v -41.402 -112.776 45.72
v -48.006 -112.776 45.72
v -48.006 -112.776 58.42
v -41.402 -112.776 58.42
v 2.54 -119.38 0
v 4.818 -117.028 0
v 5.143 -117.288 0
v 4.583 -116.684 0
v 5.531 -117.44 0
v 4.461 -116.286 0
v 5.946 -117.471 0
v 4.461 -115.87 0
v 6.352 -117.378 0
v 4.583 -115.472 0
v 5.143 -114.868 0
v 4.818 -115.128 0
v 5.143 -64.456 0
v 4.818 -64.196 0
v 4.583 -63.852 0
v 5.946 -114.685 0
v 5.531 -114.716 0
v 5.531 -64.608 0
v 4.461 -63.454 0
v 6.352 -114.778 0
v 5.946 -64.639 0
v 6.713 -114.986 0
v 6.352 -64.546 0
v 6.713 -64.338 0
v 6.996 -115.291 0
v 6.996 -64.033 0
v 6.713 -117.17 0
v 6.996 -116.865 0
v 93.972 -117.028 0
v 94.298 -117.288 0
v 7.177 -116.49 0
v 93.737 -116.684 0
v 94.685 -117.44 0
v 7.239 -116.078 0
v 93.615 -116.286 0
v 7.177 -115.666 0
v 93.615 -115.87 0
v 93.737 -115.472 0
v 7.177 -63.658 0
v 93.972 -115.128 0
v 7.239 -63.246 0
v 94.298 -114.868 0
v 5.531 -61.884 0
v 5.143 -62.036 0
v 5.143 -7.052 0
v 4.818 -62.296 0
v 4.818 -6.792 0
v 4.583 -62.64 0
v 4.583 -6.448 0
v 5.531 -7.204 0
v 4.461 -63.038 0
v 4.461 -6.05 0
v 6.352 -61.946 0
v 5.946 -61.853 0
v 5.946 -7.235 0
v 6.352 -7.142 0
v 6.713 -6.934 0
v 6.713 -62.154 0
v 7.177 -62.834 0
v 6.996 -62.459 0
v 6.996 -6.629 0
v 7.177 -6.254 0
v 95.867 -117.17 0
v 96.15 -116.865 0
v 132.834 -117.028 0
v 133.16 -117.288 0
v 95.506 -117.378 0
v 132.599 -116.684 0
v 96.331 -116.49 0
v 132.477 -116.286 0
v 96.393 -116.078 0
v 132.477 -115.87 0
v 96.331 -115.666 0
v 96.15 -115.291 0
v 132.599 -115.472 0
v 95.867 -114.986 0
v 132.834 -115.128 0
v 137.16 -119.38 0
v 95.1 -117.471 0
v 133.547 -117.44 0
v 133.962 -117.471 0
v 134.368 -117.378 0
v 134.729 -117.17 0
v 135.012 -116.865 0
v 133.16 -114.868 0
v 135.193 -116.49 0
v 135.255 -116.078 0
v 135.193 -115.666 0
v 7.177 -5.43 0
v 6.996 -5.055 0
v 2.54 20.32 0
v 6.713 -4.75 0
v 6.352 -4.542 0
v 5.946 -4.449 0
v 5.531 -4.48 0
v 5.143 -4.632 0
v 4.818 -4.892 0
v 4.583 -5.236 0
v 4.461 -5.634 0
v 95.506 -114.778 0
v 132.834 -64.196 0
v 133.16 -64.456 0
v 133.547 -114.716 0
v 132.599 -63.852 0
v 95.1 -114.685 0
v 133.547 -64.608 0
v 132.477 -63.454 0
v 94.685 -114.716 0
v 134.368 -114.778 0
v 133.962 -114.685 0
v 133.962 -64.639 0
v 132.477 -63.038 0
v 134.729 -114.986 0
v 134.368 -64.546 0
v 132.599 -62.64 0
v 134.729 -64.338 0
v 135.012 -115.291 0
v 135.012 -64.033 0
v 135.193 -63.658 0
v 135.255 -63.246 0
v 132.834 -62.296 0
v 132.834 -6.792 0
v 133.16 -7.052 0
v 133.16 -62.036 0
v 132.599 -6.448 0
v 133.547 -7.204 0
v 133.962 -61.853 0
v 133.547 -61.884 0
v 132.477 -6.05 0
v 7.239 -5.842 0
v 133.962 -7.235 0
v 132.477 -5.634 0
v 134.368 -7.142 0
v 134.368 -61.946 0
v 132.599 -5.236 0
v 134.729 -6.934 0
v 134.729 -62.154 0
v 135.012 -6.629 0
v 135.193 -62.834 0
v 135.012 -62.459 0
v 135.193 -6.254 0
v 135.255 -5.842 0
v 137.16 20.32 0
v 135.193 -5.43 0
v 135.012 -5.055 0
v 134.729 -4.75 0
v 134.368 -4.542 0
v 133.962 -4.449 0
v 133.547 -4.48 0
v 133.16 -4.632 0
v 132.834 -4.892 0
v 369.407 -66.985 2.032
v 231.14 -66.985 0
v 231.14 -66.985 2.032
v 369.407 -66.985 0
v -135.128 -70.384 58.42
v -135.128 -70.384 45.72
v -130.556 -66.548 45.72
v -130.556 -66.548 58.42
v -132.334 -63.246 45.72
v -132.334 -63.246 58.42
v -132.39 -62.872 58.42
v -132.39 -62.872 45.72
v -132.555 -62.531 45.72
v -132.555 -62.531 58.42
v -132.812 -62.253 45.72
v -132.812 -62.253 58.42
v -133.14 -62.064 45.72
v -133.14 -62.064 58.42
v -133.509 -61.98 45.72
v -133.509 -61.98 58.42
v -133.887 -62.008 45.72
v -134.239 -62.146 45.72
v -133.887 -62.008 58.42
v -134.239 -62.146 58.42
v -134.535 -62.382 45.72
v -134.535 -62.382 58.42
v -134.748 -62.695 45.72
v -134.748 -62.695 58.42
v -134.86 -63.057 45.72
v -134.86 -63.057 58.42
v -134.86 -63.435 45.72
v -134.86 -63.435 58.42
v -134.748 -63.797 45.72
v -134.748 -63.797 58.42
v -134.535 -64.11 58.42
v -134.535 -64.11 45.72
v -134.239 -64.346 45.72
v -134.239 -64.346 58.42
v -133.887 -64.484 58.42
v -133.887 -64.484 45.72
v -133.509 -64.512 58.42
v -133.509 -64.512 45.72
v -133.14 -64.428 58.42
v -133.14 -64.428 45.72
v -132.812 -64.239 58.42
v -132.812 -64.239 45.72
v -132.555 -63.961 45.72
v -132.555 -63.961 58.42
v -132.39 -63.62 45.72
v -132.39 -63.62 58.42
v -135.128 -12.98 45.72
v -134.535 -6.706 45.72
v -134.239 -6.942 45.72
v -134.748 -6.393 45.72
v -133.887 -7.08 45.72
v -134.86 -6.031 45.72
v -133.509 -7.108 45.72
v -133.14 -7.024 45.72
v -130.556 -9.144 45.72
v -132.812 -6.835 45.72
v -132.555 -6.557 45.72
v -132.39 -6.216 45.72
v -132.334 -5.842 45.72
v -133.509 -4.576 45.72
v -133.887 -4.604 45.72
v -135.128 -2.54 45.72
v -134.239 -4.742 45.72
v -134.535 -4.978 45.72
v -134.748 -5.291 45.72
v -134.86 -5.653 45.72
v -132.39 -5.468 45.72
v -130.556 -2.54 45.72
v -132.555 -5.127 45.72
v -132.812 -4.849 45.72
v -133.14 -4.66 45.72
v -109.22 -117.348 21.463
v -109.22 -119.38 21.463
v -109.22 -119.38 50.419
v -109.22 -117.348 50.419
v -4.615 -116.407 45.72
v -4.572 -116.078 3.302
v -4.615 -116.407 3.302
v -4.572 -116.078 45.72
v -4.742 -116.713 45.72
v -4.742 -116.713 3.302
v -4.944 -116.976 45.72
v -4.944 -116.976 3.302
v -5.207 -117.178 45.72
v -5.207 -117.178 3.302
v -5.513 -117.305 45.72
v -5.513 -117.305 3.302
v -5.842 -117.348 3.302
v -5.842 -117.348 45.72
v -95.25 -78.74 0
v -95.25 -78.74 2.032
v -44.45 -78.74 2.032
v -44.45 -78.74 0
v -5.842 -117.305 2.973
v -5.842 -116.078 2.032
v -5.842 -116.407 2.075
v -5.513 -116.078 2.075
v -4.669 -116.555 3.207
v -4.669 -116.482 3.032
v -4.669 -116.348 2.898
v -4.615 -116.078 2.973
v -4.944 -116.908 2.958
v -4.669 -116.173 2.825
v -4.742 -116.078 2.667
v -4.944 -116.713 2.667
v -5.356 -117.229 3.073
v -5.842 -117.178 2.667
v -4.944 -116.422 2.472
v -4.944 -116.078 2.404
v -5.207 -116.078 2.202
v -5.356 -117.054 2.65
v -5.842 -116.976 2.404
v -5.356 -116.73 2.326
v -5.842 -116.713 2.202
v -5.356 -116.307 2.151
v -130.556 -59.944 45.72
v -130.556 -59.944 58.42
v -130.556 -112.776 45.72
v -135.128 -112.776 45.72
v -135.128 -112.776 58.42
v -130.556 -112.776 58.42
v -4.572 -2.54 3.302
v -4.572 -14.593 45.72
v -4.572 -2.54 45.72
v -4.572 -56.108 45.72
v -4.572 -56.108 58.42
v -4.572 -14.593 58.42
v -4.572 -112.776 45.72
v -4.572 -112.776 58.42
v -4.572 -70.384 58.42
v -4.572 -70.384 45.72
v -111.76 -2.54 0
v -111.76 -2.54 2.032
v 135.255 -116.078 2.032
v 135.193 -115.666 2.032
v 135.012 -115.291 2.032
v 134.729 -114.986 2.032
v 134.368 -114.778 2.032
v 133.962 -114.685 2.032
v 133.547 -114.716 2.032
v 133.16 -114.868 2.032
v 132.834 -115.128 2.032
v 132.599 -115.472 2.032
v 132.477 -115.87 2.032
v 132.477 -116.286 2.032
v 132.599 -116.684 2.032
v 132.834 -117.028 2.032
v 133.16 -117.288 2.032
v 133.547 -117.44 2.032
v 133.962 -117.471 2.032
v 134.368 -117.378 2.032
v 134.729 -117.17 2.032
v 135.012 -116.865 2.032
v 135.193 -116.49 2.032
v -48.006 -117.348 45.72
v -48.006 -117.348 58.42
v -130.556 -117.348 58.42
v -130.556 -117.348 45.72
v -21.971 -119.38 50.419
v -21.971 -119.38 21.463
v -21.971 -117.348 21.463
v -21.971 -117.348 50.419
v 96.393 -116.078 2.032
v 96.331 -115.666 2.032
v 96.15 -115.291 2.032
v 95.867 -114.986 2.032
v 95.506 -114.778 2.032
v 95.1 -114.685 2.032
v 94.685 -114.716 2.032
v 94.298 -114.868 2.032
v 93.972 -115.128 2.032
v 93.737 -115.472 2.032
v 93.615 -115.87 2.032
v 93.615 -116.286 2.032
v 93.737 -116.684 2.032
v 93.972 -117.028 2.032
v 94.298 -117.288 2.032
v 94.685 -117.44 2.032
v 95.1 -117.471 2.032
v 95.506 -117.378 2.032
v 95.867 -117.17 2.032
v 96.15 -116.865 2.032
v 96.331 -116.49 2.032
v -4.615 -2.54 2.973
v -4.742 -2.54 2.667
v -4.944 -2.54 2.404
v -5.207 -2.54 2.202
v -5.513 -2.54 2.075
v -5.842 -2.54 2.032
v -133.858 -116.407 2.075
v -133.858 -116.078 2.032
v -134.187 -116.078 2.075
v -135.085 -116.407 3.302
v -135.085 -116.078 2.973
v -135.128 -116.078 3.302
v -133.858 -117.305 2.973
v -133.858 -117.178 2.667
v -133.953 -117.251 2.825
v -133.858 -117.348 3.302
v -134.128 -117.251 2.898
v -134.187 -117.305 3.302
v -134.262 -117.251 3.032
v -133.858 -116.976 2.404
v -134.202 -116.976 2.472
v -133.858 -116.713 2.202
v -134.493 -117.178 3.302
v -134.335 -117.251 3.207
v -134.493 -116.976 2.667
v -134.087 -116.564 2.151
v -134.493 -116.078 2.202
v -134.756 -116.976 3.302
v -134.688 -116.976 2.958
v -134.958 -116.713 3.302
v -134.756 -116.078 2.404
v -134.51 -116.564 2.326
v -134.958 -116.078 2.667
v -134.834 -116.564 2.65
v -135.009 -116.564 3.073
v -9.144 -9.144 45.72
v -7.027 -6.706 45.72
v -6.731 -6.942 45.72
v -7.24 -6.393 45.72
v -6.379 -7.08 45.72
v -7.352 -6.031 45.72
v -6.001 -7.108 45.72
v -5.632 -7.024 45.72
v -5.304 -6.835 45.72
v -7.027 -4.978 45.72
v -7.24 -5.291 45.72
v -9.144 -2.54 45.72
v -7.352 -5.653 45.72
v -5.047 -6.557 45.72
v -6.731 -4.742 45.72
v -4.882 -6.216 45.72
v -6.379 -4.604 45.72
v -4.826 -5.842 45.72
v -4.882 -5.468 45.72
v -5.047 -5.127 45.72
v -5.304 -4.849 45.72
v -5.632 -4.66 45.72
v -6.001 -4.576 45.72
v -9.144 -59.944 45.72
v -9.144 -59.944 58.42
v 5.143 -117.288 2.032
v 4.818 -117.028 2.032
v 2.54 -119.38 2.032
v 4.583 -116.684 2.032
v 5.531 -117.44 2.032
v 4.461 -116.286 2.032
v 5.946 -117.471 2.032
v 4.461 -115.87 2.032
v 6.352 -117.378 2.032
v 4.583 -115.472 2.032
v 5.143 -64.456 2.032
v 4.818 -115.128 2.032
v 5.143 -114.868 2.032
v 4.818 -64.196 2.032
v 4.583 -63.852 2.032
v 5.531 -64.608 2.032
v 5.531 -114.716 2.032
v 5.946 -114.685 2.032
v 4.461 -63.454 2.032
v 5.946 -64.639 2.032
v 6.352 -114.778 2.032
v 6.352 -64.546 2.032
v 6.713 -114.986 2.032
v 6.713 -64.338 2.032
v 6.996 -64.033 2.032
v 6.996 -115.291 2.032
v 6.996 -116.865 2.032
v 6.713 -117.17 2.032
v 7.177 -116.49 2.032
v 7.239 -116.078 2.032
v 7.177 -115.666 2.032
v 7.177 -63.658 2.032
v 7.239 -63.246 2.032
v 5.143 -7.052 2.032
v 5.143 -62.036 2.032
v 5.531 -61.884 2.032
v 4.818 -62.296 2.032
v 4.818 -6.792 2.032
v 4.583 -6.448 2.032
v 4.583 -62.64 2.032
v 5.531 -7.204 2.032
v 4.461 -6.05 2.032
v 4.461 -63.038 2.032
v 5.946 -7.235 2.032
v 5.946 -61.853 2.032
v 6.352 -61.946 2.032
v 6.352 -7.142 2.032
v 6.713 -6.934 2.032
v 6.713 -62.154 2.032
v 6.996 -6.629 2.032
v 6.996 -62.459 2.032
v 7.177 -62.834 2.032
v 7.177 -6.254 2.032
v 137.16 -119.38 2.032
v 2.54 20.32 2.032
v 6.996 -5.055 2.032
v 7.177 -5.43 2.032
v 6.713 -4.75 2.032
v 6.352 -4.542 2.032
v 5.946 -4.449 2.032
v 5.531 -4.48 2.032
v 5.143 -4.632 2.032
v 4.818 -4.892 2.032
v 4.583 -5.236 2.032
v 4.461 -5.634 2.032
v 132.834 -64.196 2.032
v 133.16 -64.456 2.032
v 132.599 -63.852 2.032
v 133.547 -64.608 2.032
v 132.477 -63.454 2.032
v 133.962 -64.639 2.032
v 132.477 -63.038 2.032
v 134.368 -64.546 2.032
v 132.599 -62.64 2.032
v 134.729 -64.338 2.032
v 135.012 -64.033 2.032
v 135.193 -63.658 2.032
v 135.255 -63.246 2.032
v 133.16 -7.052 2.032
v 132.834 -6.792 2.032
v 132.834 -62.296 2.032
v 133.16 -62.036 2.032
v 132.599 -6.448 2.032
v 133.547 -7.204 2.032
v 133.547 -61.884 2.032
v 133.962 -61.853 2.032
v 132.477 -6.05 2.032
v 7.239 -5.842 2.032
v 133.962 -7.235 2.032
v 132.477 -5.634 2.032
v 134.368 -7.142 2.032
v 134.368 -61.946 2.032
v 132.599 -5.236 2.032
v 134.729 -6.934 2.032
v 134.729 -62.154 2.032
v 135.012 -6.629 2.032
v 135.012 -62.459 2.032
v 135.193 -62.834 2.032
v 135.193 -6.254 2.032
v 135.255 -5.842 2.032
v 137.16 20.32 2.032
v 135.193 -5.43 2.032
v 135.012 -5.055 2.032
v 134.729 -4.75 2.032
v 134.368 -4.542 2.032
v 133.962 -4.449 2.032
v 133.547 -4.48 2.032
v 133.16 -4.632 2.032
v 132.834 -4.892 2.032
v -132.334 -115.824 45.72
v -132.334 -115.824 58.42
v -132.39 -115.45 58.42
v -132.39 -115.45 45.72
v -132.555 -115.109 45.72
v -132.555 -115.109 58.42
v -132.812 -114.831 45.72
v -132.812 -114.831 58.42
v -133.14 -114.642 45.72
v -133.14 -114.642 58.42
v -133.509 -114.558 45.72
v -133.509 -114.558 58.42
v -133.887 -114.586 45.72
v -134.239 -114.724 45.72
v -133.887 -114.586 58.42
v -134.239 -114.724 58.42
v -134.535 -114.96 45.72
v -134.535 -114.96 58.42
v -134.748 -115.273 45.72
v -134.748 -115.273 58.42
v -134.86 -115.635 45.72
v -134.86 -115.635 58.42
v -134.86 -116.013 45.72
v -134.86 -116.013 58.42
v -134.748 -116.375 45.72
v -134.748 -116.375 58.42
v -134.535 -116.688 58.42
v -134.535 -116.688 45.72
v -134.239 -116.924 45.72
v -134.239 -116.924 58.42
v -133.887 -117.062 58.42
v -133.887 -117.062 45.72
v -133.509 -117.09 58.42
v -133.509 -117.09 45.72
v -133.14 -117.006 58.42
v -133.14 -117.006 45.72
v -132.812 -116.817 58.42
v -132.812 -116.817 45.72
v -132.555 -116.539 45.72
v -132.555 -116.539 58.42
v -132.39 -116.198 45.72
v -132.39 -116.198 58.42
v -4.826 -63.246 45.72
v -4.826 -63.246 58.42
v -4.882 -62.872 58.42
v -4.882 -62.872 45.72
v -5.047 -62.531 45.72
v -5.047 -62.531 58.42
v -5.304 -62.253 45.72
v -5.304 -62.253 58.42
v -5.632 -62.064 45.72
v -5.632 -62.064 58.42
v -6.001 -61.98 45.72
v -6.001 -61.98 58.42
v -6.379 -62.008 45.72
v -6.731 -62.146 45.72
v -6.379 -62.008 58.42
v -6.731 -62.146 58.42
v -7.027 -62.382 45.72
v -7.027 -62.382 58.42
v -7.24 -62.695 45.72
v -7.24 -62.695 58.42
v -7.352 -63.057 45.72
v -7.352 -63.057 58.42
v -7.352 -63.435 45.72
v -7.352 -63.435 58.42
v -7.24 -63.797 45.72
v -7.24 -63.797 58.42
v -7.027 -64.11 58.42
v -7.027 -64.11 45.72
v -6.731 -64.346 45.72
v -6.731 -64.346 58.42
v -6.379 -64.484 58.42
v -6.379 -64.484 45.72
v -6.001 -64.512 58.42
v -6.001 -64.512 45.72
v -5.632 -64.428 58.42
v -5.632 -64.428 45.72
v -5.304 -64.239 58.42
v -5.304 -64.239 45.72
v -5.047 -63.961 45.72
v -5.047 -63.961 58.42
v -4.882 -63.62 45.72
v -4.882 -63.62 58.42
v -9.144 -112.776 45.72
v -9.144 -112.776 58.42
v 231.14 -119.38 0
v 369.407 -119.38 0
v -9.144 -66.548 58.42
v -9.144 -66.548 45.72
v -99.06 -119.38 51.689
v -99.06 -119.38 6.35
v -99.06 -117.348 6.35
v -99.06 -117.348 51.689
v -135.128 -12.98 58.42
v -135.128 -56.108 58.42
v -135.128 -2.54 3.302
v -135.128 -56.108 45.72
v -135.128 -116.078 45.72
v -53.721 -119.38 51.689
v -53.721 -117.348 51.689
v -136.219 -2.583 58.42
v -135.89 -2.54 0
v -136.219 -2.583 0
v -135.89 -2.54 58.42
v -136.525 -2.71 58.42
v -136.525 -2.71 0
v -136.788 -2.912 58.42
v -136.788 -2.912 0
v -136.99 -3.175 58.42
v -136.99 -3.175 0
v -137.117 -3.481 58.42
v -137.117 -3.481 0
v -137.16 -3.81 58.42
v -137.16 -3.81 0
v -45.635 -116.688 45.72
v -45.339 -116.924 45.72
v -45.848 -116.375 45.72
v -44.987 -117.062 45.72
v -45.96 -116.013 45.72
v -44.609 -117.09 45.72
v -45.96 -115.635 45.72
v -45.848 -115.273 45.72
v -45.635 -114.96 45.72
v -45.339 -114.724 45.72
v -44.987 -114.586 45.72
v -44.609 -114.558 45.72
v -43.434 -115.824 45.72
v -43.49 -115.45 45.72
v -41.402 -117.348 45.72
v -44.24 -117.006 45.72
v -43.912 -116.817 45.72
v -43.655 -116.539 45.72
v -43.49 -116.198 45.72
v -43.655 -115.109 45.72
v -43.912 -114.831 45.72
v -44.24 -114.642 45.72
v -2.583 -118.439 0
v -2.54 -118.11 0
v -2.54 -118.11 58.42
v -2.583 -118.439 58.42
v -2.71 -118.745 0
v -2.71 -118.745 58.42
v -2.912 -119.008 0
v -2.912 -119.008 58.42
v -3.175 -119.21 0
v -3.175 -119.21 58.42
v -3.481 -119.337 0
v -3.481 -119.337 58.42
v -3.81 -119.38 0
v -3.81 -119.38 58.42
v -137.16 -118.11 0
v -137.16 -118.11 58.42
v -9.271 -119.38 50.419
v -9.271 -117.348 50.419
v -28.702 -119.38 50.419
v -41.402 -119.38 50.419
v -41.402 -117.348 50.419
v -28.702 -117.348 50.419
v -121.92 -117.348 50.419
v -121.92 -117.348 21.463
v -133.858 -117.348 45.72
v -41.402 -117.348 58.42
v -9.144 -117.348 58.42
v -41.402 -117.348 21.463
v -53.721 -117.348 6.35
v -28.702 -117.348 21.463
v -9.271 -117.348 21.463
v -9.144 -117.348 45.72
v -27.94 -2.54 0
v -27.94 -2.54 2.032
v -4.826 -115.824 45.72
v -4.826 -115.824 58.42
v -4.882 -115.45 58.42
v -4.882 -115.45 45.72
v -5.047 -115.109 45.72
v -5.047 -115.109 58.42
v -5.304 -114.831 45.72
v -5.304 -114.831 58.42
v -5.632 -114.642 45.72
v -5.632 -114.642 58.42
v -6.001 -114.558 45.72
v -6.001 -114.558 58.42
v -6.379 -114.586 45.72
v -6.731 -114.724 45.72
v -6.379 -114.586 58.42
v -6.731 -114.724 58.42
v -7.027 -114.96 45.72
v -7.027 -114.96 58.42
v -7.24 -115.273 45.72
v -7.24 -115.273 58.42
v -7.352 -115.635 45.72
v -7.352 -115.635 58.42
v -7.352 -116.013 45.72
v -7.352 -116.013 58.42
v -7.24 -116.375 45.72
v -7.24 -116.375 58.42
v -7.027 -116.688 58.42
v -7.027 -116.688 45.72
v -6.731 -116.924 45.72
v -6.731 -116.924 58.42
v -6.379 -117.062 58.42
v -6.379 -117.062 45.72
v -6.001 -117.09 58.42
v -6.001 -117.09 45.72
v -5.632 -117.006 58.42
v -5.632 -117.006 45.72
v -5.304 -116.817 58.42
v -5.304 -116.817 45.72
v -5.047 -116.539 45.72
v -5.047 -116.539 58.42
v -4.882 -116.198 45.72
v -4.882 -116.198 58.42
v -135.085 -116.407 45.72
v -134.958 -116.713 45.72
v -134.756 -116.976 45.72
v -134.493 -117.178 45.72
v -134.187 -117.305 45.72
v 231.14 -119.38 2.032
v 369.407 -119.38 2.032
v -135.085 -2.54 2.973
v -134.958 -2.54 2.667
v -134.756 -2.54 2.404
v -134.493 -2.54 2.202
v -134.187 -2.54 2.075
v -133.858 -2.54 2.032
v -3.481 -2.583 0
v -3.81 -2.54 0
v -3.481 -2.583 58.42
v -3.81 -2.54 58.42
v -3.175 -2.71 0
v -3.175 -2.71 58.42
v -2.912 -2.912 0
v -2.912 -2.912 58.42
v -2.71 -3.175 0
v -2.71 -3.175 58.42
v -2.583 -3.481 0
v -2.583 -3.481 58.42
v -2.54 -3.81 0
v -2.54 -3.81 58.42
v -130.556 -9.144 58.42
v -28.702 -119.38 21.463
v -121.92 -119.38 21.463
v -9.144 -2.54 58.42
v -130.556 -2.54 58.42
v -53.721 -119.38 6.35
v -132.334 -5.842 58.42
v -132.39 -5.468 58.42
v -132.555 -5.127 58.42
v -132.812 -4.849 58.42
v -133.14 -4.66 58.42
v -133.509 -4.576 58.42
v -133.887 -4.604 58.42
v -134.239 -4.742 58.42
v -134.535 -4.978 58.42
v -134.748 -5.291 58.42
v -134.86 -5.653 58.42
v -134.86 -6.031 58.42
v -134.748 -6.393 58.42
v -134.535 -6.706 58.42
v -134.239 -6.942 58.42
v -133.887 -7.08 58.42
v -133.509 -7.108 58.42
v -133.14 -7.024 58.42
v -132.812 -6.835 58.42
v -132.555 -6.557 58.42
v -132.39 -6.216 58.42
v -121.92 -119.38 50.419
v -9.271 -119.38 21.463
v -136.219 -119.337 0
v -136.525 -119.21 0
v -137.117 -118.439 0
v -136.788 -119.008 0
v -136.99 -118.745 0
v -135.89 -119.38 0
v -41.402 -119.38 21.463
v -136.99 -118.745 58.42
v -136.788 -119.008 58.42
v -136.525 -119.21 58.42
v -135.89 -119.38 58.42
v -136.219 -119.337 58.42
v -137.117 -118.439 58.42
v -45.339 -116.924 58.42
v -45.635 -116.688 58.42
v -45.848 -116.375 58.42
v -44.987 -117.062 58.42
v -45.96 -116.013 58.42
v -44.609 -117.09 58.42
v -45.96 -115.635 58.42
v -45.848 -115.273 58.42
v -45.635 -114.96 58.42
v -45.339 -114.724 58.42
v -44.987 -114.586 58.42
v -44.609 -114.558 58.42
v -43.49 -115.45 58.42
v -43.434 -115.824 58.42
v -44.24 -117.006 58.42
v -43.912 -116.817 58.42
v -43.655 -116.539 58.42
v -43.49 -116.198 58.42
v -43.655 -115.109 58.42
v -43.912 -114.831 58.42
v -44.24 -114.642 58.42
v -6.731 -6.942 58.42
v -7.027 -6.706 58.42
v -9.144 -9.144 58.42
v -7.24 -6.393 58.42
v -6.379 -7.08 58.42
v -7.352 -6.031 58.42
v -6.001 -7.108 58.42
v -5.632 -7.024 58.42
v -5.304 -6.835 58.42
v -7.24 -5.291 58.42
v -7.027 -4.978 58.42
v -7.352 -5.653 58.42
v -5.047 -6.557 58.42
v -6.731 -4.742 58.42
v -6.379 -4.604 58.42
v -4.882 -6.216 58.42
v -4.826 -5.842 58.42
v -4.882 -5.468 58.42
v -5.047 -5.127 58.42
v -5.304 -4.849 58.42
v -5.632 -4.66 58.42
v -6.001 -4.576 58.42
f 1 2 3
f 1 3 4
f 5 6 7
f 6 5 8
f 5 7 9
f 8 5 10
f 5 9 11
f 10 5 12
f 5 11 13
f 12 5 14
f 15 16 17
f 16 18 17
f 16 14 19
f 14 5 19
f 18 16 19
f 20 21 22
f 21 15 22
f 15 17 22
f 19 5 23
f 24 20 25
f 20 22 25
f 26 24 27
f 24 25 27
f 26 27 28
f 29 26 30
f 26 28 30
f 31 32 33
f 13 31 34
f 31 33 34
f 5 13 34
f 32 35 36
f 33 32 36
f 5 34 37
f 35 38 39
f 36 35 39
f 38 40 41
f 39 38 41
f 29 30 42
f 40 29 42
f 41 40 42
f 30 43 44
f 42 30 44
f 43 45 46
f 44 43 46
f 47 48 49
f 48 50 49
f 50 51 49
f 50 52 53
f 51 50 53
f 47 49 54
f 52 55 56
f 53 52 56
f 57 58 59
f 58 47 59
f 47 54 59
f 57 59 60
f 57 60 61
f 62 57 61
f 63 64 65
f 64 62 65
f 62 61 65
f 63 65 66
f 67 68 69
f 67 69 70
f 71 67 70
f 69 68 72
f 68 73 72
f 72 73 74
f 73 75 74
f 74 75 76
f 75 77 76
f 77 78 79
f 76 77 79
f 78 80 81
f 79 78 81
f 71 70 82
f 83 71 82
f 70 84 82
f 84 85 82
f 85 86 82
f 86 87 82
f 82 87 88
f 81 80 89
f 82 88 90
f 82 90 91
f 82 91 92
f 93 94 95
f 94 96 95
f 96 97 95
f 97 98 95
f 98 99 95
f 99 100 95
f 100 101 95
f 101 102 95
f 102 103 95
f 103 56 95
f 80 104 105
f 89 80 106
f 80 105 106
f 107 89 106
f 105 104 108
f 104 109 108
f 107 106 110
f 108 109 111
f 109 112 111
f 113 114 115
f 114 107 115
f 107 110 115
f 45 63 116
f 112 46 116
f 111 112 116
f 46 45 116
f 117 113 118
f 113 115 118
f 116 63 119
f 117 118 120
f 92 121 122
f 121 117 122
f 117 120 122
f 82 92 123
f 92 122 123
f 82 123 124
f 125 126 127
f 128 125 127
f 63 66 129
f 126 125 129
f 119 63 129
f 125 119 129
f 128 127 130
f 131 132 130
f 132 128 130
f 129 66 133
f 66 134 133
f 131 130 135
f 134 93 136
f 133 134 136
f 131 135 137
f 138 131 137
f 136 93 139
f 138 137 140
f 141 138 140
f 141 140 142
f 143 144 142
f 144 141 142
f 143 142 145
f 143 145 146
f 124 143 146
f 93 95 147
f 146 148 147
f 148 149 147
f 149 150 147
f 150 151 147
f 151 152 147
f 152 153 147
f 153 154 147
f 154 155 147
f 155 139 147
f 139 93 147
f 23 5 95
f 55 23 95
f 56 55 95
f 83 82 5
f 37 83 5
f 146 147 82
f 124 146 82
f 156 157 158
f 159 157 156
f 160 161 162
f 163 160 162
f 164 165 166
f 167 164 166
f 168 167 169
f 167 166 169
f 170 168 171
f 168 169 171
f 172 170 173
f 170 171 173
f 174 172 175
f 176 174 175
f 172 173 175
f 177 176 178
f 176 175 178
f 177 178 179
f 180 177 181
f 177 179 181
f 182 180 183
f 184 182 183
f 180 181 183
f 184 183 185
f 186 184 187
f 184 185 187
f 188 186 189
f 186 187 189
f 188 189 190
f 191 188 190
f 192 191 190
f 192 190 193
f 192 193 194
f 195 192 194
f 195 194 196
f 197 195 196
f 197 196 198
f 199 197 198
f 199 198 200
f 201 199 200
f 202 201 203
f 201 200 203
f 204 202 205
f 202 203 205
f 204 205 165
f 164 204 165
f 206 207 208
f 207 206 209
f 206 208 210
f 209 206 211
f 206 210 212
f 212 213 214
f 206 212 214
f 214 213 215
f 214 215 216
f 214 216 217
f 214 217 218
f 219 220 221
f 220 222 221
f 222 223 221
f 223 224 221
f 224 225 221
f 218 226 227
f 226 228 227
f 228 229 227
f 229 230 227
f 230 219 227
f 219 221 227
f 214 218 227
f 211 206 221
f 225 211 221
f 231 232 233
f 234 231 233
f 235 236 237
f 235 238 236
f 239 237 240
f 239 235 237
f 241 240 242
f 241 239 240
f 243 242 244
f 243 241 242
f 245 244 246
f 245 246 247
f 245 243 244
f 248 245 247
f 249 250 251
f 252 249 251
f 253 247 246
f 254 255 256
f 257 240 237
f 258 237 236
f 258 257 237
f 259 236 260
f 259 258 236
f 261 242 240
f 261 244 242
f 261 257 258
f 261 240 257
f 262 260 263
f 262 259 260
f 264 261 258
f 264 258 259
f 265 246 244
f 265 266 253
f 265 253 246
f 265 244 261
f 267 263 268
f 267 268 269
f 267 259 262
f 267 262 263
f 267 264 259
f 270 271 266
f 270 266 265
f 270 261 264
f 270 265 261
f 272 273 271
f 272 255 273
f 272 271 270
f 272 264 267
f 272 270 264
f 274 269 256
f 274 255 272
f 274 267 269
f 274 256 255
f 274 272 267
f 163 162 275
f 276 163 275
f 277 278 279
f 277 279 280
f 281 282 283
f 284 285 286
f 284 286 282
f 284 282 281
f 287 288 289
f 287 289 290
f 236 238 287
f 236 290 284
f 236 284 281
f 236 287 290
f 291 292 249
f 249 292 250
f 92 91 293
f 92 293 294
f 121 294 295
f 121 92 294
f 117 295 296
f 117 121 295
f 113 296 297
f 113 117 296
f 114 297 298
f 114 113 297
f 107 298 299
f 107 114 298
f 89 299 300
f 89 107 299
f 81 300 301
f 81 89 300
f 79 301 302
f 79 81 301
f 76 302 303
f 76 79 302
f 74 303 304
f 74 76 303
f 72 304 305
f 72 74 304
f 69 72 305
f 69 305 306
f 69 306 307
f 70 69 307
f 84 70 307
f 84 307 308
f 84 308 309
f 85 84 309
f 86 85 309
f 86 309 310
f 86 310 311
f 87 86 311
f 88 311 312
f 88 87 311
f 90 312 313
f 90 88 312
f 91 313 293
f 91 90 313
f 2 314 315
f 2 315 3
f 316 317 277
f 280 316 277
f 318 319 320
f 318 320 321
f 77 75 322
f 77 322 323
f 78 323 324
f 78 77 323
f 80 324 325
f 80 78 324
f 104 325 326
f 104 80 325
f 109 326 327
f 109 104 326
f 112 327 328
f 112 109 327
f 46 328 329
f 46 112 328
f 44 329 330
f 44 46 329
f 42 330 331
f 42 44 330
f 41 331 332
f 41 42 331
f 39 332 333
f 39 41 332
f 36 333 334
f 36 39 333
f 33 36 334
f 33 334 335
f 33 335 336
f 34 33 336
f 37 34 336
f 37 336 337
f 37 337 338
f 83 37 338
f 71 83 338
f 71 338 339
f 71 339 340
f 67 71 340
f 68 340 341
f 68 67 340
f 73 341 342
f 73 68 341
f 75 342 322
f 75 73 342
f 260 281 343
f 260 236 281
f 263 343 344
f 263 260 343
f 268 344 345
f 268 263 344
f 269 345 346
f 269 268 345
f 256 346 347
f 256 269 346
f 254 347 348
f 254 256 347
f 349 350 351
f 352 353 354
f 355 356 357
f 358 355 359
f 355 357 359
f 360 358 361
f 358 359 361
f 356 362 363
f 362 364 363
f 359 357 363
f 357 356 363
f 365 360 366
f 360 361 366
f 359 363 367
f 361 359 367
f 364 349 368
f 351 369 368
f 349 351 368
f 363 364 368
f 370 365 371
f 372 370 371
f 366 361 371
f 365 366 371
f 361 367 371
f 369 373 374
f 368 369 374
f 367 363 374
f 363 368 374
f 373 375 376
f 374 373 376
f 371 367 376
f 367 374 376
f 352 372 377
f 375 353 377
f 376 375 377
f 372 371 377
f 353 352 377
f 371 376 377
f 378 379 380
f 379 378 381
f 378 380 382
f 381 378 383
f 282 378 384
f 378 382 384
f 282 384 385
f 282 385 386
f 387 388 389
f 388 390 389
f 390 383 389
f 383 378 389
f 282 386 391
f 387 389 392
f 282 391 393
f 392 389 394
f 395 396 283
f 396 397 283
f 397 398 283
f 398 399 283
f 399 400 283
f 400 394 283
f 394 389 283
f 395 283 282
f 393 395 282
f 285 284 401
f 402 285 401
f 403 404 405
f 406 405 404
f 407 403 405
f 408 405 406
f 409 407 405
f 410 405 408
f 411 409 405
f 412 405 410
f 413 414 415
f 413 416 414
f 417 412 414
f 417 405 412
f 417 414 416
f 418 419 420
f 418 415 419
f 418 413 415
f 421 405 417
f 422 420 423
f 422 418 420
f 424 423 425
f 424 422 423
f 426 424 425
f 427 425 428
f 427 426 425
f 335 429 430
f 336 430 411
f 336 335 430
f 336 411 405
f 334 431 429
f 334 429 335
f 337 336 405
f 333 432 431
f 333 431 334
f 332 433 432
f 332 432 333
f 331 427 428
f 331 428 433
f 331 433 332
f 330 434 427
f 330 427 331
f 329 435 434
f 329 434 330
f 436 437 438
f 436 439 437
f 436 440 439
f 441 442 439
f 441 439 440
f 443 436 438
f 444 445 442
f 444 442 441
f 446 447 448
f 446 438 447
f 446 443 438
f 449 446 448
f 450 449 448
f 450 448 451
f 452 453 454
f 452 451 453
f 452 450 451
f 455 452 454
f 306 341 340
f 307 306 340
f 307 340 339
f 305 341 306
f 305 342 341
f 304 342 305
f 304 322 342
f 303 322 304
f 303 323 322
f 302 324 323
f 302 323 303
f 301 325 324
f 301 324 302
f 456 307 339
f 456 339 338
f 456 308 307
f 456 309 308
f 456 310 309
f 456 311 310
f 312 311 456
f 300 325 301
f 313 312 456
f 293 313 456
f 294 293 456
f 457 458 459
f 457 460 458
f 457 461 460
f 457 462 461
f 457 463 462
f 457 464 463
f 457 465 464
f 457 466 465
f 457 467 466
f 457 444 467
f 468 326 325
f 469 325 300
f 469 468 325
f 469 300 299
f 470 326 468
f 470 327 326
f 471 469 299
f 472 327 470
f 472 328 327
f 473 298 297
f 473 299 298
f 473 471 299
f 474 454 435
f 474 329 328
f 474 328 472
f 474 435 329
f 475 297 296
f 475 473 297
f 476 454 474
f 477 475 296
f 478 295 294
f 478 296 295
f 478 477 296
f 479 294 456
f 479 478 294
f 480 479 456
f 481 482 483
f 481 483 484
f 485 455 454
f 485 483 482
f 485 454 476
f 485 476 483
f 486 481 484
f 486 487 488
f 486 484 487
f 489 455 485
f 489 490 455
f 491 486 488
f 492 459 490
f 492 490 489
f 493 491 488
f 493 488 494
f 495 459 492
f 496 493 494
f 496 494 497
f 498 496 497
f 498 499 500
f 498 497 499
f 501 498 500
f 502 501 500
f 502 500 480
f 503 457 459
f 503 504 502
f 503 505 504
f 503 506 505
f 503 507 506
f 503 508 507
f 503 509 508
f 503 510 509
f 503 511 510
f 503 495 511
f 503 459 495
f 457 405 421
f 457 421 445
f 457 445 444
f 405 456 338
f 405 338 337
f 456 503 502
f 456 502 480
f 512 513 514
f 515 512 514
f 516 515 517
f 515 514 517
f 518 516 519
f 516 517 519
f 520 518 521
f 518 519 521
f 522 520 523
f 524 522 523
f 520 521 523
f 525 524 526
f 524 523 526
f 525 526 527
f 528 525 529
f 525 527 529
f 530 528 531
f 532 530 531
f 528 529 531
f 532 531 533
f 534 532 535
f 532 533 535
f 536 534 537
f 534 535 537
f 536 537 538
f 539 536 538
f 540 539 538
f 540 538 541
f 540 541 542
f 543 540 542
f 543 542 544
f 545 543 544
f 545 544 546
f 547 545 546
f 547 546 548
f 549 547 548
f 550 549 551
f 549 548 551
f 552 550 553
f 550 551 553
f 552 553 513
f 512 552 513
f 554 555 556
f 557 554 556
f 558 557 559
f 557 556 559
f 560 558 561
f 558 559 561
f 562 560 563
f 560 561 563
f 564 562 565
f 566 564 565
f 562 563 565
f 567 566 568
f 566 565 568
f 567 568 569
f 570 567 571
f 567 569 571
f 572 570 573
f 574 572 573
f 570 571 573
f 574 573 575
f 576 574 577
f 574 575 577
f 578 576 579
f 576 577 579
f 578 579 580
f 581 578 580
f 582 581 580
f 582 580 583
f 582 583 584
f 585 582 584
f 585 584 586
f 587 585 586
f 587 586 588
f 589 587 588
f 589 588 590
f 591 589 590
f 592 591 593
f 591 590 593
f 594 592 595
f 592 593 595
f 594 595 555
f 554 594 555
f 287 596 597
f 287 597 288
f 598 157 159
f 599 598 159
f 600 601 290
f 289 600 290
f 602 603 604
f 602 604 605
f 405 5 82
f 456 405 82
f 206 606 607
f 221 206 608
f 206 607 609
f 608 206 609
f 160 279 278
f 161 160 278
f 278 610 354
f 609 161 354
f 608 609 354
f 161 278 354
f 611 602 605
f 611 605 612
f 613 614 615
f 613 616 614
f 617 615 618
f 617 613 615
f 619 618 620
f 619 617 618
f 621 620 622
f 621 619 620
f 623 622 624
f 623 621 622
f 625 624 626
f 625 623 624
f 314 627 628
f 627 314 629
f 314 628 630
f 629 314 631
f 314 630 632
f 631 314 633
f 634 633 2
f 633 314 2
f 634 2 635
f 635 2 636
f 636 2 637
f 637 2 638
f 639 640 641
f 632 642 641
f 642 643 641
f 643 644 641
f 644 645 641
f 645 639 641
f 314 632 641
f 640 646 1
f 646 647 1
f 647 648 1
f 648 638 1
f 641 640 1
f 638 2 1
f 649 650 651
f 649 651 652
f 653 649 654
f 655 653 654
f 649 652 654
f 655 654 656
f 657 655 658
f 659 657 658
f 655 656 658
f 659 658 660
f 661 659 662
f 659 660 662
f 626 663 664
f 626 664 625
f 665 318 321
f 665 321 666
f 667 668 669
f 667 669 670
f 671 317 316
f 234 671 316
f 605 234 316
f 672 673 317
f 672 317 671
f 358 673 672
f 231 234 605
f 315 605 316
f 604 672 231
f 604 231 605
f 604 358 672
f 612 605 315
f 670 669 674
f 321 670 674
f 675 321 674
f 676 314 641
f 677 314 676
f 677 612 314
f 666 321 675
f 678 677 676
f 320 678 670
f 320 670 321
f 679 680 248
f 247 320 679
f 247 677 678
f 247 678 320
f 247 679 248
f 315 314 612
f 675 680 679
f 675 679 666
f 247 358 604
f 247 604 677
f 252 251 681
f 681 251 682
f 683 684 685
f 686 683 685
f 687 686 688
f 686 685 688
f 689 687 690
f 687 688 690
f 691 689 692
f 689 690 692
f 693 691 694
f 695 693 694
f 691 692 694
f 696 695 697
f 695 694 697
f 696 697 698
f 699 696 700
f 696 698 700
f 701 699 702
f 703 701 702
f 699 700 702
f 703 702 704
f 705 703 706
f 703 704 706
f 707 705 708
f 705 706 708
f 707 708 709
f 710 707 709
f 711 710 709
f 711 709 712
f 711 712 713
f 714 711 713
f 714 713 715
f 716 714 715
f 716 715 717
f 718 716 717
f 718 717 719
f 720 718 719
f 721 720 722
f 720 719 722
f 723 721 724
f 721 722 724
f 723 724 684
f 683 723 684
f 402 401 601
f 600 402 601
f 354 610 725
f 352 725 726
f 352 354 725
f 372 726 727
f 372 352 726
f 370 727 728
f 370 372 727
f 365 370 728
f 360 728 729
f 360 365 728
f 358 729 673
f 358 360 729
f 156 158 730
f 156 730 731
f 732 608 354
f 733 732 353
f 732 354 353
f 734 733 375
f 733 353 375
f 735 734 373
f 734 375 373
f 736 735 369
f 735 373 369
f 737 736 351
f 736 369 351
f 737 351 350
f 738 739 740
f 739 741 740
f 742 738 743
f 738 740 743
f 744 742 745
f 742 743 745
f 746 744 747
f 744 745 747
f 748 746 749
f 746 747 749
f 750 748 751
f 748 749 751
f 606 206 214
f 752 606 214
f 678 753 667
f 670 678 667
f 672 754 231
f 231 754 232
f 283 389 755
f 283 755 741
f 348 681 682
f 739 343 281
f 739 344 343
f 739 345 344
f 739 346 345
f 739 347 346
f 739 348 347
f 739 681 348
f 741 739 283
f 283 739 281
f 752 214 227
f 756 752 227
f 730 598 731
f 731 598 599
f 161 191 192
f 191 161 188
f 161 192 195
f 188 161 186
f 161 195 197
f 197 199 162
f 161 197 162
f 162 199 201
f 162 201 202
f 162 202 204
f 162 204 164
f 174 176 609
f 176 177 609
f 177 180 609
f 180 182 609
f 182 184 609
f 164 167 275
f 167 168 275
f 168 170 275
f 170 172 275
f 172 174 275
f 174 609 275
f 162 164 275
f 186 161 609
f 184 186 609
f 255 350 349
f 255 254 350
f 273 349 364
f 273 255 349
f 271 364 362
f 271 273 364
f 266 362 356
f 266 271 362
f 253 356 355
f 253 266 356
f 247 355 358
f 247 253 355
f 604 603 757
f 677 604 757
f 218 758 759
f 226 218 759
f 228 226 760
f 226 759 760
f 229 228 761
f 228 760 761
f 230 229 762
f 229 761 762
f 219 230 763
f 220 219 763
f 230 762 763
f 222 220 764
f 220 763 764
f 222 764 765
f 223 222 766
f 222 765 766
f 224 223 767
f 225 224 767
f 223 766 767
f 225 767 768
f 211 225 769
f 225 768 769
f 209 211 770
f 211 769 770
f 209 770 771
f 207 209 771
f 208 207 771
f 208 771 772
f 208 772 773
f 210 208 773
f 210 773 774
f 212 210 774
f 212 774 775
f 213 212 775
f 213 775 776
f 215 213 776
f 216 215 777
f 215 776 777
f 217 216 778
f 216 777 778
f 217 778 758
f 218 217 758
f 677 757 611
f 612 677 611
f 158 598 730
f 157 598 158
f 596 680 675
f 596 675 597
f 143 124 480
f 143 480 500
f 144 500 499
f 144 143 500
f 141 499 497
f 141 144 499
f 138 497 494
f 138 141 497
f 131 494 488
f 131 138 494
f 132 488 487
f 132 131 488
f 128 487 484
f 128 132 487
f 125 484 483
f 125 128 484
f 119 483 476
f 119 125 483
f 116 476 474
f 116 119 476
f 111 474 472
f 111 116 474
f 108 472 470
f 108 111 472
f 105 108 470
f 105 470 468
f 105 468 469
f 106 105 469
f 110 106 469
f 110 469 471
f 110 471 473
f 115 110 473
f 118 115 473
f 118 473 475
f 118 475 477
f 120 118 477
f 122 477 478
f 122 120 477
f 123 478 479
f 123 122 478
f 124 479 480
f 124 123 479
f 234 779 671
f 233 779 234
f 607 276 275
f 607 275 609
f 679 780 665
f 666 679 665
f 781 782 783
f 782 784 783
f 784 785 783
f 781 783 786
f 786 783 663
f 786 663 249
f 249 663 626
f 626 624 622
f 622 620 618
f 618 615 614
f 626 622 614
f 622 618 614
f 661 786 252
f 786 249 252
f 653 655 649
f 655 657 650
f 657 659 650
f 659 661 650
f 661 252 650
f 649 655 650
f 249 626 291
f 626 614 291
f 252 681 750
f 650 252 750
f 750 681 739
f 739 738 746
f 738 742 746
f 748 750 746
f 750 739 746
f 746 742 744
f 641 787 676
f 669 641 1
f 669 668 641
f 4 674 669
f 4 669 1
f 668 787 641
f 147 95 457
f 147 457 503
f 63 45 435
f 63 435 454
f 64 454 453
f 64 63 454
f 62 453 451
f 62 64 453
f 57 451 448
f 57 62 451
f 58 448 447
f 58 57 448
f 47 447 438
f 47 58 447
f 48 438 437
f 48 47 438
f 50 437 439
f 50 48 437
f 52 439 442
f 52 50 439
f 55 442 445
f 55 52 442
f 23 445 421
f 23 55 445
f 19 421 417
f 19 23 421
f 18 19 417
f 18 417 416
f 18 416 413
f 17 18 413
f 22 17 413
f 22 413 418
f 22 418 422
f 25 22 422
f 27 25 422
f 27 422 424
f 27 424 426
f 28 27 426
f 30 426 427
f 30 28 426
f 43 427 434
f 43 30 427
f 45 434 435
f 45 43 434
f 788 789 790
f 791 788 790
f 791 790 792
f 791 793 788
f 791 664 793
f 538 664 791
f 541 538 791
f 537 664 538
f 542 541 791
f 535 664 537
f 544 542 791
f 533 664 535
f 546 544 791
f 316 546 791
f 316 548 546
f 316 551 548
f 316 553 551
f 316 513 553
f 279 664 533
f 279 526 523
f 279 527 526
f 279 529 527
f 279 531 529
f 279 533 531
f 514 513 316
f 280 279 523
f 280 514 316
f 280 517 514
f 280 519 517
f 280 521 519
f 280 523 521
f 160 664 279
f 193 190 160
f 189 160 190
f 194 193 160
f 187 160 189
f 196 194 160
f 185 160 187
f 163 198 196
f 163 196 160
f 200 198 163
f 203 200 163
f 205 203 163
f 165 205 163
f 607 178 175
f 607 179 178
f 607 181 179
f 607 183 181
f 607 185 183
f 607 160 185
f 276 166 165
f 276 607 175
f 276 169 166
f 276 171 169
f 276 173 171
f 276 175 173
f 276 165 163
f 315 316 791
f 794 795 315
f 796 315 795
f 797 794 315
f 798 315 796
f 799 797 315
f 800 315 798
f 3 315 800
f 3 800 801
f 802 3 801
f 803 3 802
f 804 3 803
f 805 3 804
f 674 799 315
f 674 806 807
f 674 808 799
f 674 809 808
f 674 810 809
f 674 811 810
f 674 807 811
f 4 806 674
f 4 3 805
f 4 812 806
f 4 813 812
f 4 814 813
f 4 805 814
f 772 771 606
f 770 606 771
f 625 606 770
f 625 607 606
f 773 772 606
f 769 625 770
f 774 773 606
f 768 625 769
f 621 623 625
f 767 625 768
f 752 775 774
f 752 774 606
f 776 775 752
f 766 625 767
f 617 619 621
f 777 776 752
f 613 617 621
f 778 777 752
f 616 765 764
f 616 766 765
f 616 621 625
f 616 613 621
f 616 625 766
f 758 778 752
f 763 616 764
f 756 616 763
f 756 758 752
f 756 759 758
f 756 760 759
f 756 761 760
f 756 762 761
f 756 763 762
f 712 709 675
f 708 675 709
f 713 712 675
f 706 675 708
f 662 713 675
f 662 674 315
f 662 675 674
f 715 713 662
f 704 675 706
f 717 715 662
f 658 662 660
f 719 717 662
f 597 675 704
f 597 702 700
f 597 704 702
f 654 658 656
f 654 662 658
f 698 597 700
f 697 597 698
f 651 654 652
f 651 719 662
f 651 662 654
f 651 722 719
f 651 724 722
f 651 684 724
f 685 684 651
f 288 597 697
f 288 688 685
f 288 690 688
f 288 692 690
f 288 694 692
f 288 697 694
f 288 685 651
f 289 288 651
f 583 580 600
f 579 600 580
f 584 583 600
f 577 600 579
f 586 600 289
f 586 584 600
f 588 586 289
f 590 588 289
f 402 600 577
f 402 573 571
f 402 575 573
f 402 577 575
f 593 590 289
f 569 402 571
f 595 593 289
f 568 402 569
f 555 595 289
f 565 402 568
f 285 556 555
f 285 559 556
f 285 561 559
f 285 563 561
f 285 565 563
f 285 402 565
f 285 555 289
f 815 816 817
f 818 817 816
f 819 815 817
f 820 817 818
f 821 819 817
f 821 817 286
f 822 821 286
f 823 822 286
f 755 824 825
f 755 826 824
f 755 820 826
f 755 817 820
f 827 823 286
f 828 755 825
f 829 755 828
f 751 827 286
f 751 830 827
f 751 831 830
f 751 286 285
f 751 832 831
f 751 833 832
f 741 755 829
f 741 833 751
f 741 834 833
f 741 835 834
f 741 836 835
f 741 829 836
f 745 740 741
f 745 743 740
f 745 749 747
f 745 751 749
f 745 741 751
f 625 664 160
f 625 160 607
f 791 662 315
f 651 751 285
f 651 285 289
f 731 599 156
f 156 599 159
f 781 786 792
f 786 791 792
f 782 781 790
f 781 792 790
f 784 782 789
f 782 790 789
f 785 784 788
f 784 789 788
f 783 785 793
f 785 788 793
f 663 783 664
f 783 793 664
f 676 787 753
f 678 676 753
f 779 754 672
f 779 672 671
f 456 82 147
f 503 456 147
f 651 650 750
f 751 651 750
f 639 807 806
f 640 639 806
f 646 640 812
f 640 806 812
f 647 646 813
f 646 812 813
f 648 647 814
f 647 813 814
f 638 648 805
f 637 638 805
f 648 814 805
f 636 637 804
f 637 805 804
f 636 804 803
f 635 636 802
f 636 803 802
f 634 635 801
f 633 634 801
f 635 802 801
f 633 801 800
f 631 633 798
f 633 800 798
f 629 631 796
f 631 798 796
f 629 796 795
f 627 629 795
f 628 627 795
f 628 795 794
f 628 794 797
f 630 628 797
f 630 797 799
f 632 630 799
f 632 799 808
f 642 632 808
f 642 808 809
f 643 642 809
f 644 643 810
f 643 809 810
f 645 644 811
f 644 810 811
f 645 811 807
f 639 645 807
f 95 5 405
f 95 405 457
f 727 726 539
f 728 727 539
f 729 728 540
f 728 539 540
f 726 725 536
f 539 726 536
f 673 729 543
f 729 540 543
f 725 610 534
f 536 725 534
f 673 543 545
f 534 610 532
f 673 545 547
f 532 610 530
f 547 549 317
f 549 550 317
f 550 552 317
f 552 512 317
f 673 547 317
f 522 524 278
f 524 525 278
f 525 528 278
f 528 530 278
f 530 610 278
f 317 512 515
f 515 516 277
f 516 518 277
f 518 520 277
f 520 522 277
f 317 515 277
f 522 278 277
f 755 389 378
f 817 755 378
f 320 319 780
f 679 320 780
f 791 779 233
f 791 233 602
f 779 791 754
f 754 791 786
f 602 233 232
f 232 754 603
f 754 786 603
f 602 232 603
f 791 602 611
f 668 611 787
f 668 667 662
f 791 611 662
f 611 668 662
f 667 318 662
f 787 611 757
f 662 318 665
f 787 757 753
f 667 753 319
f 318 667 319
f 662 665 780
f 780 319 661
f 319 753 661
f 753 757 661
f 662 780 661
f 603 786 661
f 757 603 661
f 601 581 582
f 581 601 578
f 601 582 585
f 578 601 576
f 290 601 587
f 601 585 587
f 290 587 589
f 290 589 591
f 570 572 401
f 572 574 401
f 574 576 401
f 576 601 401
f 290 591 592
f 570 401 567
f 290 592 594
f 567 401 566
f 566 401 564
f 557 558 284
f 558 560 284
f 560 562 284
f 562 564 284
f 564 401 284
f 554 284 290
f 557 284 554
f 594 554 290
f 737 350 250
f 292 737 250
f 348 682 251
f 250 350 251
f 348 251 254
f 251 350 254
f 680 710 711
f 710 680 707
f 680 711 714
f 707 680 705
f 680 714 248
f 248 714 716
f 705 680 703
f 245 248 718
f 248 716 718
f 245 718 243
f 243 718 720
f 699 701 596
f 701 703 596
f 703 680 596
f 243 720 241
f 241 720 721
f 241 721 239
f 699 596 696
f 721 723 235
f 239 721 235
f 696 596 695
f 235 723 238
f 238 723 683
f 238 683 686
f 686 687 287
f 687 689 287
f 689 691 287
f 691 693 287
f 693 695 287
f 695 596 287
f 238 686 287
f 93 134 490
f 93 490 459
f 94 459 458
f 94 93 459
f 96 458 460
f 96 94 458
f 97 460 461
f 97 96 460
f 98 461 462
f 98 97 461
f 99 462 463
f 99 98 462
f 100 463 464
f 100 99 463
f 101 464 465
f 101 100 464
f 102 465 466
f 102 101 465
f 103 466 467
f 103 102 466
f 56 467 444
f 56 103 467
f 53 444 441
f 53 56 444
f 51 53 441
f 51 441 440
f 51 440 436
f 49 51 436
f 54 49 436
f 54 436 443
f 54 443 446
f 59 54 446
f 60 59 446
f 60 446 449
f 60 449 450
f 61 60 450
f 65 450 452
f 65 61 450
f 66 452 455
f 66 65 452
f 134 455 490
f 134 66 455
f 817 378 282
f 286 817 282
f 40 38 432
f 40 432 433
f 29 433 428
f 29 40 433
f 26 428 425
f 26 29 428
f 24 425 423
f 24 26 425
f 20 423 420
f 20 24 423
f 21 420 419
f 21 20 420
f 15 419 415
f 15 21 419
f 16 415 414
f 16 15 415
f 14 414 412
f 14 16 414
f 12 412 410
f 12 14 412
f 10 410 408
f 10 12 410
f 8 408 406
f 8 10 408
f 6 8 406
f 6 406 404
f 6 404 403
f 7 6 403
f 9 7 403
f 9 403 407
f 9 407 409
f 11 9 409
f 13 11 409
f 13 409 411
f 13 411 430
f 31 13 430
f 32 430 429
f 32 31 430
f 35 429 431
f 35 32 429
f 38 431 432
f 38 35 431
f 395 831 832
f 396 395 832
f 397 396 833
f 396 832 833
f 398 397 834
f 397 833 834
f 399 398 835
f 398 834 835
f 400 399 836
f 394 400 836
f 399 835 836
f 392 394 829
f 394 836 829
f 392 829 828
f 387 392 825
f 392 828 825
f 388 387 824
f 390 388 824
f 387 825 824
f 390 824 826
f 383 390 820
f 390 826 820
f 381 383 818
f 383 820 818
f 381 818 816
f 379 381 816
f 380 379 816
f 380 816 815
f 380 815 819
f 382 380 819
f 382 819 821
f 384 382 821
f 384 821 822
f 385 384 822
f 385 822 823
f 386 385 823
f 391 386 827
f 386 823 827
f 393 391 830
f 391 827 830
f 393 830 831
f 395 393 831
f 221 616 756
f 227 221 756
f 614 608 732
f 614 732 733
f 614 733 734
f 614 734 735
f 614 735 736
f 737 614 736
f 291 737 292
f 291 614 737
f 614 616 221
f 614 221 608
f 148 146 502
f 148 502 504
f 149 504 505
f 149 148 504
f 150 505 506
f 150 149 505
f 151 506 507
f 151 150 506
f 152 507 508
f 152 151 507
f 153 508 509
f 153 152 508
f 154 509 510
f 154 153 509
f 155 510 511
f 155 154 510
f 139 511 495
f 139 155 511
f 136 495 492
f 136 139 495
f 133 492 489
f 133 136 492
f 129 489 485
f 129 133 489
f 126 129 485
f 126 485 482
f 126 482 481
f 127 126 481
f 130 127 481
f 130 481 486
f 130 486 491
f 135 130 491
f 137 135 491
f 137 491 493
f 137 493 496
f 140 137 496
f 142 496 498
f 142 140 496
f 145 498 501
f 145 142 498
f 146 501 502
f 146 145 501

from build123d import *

# Parameters (mm, degrees)
F0_W      = 134.62
F0_H      = 116.84
F1_DEPTH  = 58.42
F2_T      = -2.032
F3_DEPTH  = 2.032
F4_W      = 45.339
F4_H      = 45.339
F4_W_2    = 12.7
F4_H_2    = 28.956
F5_DEPTH  = 2.032
F6_W      = 4.572
F6_H      = 4.572
F6_R      = 1.27
F6_W_2    = 6.604
F7_DEPTH  = 12.7
F8_W      = 134.62
F8_H      = 139.7
F8_R      = 1.397
F9_DEPTH  = 2.032
F8_W_2    = 138.2675617933
F8_H_2    = 52.3949367452
F10_R     = 1.27
F11_R     = 1.27
F13_DEPTH = 2.032


with BuildPart() as f1:
    # F0 (on Top) → F1 (new body)
    with BuildSketch(Plane.XY):
        with Locations((-69.85, -60.96)):
            Rectangle(F0_W, F0_H)
    extrude(amount=F1_DEPTH)

    # F2
    f2_openings = [f1.faces().sort_by_distance(p)[0] for p in [
        (-69.85, -60.96, 58.42),
    ]]
    offset(amount=F2_T, openings=f2_openings)

    # F3 (cut, through all): a face of the model
    f3_faces = [f1.faces().sort_by_distance(p)[0] for p in [
        (-69.85, -4.572, 30.226),
    ]]
    extrude(f3_faces, amount=-F3_DEPTH, mode=Mode.SUBTRACT)

    # F4 (on face) → F5 (cut, through all)
    with BuildSketch(Plane.XZ.offset(119.38)):
        with Locations((-76.3905, 29.0195)):
            Rectangle(F4_W, F4_H)
        with Locations((-35.052, 35.941)):
            Rectangle(F4_W_2, F4_H_2)
        with Locations((-15.621, 35.941)):
            Rectangle(F4_W_2, F4_H_2)
        with Locations((-115.57, 35.941)):
            Rectangle(F4_W_2, F4_H_2)
    extrude(amount=-F5_DEPTH, mode=Mode.SUBTRACT)

    # F6 (on face) → F7 (join)
    with BuildSketch(Plane.XY.offset(58.42)):
        with Locations((-6.858, -115.062)):
            Rectangle(F6_W, F6_H)
        with Locations((-6.096, -115.824)):
            Circle(F6_R, mode=Mode.SUBTRACT)
        with Locations((-132.842, -115.062)):
            Rectangle(F6_W, F6_H)
        with Locations((-133.604, -115.824)):
            Circle(F6_R, mode=Mode.SUBTRACT)
        Polygon((-9.144, -59.944), (-9.144, -66.548), (-4.572, -70.3843635137), (-4.572, -56.1076364863), align=None)
        with Locations((-6.096, -63.246)):
            Circle(F6_R, mode=Mode.SUBTRACT)
        Polygon((-135.128, -70.3843635137), (-130.556, -66.548), (-130.556, -59.944), (-135.128, -56.1076364863), align=None)
        with Locations((-133.604, -63.246)):
            Circle(F6_R, mode=Mode.SUBTRACT)
        Polygon((-4.572, -14.5926974254), (-4.572, -2.54), (-9.144, -2.54), (-9.144, -9.144), align=None)
        with Locations((-6.096, -5.842)):
            Circle(F6_R, mode=Mode.SUBTRACT)
        Polygon((-130.556, -2.54), (-135.128, -2.54), (-135.128, -12.9803635138), (-130.556, -9.144), align=None)
        with Locations((-133.604, -5.842)):
            Circle(F6_R, mode=Mode.SUBTRACT)
        with Locations((-44.704, -115.062)):
            Rectangle(F6_W_2, F6_H)
        with Locations((-44.704, -115.824)):
            Circle(F6_R, mode=Mode.SUBTRACT)
    extrude(amount=-F7_DEPTH)

    # F10
    f10_edges = [f1.edges().sort_by_distance(p)[0] for p in [
        (-137.16, -119.38, 29.21),
        (-137.16, -2.54, 29.21),
        (-2.54, -119.38, 29.21),
        (-2.54, -2.54, 29.21),
    ]]
    fillet(f10_edges, radius=F10_R)

    # F11
    f11_edges = [f1.edges().sort_by_distance(p)[0] for p in [
        (-135.128, -59.944, 2.032),
        (-69.85, -117.348, 2.032),
        (-135.128, -117.348, 23.876),
        (-4.572, -117.348, 23.876),
        (-4.572, -59.944, 2.032),
    ]]
    fillet(f11_edges, radius=F11_R)

    # F12 (on face) → F13 (cut, through all)
    with BuildSketch(Plane.XY.offset(2.032)):
        Polygon((-27.94, -2.54), (-111.76, -2.54), (-95.25, -78.74), (-44.45, -78.74), align=None)
    extrude(amount=-F13_DEPTH, mode=Mode.SUBTRACT)


with BuildPart() as f9:
    # F8 (on Top) → F9 (new body)
    with BuildSketch(Plane.XY):
        with Locations((69.85, -49.53)):
            Rectangle(F8_W, F8_H)
        with Locations((5.842, -116.078)):
            Circle(F8_R, mode=Mode.SUBTRACT)
        with Locations((94.996, -116.078)):
            Circle(F8_R, mode=Mode.SUBTRACT)
        with Locations((133.858, -116.078)):
            Circle(F8_R, mode=Mode.SUBTRACT)
        with Locations((5.842, -63.246)):
            Circle(F8_R, mode=Mode.SUBTRACT)
        with Locations((133.858, -63.246)):
            Circle(F8_R, mode=Mode.SUBTRACT)
        with Locations((5.842, -5.842)):
            Circle(F8_R, mode=Mode.SUBTRACT)
        with Locations((133.858, -5.842)):
            Circle(F8_R, mode=Mode.SUBTRACT)
    extrude(amount=F9_DEPTH)


with BuildPart() as f9b:
    # F8 (on Top) → F9, piece 2 (new body)
    with BuildSketch(Plane.XY):
        with Locations((300.2735450864, -93.1825316274)):
            Rectangle(F8_W_2, F8_H_2)
    extrude(amount=F9_DEPTH)


solid = Compound([f1.part, f9.part, f9b.part])
